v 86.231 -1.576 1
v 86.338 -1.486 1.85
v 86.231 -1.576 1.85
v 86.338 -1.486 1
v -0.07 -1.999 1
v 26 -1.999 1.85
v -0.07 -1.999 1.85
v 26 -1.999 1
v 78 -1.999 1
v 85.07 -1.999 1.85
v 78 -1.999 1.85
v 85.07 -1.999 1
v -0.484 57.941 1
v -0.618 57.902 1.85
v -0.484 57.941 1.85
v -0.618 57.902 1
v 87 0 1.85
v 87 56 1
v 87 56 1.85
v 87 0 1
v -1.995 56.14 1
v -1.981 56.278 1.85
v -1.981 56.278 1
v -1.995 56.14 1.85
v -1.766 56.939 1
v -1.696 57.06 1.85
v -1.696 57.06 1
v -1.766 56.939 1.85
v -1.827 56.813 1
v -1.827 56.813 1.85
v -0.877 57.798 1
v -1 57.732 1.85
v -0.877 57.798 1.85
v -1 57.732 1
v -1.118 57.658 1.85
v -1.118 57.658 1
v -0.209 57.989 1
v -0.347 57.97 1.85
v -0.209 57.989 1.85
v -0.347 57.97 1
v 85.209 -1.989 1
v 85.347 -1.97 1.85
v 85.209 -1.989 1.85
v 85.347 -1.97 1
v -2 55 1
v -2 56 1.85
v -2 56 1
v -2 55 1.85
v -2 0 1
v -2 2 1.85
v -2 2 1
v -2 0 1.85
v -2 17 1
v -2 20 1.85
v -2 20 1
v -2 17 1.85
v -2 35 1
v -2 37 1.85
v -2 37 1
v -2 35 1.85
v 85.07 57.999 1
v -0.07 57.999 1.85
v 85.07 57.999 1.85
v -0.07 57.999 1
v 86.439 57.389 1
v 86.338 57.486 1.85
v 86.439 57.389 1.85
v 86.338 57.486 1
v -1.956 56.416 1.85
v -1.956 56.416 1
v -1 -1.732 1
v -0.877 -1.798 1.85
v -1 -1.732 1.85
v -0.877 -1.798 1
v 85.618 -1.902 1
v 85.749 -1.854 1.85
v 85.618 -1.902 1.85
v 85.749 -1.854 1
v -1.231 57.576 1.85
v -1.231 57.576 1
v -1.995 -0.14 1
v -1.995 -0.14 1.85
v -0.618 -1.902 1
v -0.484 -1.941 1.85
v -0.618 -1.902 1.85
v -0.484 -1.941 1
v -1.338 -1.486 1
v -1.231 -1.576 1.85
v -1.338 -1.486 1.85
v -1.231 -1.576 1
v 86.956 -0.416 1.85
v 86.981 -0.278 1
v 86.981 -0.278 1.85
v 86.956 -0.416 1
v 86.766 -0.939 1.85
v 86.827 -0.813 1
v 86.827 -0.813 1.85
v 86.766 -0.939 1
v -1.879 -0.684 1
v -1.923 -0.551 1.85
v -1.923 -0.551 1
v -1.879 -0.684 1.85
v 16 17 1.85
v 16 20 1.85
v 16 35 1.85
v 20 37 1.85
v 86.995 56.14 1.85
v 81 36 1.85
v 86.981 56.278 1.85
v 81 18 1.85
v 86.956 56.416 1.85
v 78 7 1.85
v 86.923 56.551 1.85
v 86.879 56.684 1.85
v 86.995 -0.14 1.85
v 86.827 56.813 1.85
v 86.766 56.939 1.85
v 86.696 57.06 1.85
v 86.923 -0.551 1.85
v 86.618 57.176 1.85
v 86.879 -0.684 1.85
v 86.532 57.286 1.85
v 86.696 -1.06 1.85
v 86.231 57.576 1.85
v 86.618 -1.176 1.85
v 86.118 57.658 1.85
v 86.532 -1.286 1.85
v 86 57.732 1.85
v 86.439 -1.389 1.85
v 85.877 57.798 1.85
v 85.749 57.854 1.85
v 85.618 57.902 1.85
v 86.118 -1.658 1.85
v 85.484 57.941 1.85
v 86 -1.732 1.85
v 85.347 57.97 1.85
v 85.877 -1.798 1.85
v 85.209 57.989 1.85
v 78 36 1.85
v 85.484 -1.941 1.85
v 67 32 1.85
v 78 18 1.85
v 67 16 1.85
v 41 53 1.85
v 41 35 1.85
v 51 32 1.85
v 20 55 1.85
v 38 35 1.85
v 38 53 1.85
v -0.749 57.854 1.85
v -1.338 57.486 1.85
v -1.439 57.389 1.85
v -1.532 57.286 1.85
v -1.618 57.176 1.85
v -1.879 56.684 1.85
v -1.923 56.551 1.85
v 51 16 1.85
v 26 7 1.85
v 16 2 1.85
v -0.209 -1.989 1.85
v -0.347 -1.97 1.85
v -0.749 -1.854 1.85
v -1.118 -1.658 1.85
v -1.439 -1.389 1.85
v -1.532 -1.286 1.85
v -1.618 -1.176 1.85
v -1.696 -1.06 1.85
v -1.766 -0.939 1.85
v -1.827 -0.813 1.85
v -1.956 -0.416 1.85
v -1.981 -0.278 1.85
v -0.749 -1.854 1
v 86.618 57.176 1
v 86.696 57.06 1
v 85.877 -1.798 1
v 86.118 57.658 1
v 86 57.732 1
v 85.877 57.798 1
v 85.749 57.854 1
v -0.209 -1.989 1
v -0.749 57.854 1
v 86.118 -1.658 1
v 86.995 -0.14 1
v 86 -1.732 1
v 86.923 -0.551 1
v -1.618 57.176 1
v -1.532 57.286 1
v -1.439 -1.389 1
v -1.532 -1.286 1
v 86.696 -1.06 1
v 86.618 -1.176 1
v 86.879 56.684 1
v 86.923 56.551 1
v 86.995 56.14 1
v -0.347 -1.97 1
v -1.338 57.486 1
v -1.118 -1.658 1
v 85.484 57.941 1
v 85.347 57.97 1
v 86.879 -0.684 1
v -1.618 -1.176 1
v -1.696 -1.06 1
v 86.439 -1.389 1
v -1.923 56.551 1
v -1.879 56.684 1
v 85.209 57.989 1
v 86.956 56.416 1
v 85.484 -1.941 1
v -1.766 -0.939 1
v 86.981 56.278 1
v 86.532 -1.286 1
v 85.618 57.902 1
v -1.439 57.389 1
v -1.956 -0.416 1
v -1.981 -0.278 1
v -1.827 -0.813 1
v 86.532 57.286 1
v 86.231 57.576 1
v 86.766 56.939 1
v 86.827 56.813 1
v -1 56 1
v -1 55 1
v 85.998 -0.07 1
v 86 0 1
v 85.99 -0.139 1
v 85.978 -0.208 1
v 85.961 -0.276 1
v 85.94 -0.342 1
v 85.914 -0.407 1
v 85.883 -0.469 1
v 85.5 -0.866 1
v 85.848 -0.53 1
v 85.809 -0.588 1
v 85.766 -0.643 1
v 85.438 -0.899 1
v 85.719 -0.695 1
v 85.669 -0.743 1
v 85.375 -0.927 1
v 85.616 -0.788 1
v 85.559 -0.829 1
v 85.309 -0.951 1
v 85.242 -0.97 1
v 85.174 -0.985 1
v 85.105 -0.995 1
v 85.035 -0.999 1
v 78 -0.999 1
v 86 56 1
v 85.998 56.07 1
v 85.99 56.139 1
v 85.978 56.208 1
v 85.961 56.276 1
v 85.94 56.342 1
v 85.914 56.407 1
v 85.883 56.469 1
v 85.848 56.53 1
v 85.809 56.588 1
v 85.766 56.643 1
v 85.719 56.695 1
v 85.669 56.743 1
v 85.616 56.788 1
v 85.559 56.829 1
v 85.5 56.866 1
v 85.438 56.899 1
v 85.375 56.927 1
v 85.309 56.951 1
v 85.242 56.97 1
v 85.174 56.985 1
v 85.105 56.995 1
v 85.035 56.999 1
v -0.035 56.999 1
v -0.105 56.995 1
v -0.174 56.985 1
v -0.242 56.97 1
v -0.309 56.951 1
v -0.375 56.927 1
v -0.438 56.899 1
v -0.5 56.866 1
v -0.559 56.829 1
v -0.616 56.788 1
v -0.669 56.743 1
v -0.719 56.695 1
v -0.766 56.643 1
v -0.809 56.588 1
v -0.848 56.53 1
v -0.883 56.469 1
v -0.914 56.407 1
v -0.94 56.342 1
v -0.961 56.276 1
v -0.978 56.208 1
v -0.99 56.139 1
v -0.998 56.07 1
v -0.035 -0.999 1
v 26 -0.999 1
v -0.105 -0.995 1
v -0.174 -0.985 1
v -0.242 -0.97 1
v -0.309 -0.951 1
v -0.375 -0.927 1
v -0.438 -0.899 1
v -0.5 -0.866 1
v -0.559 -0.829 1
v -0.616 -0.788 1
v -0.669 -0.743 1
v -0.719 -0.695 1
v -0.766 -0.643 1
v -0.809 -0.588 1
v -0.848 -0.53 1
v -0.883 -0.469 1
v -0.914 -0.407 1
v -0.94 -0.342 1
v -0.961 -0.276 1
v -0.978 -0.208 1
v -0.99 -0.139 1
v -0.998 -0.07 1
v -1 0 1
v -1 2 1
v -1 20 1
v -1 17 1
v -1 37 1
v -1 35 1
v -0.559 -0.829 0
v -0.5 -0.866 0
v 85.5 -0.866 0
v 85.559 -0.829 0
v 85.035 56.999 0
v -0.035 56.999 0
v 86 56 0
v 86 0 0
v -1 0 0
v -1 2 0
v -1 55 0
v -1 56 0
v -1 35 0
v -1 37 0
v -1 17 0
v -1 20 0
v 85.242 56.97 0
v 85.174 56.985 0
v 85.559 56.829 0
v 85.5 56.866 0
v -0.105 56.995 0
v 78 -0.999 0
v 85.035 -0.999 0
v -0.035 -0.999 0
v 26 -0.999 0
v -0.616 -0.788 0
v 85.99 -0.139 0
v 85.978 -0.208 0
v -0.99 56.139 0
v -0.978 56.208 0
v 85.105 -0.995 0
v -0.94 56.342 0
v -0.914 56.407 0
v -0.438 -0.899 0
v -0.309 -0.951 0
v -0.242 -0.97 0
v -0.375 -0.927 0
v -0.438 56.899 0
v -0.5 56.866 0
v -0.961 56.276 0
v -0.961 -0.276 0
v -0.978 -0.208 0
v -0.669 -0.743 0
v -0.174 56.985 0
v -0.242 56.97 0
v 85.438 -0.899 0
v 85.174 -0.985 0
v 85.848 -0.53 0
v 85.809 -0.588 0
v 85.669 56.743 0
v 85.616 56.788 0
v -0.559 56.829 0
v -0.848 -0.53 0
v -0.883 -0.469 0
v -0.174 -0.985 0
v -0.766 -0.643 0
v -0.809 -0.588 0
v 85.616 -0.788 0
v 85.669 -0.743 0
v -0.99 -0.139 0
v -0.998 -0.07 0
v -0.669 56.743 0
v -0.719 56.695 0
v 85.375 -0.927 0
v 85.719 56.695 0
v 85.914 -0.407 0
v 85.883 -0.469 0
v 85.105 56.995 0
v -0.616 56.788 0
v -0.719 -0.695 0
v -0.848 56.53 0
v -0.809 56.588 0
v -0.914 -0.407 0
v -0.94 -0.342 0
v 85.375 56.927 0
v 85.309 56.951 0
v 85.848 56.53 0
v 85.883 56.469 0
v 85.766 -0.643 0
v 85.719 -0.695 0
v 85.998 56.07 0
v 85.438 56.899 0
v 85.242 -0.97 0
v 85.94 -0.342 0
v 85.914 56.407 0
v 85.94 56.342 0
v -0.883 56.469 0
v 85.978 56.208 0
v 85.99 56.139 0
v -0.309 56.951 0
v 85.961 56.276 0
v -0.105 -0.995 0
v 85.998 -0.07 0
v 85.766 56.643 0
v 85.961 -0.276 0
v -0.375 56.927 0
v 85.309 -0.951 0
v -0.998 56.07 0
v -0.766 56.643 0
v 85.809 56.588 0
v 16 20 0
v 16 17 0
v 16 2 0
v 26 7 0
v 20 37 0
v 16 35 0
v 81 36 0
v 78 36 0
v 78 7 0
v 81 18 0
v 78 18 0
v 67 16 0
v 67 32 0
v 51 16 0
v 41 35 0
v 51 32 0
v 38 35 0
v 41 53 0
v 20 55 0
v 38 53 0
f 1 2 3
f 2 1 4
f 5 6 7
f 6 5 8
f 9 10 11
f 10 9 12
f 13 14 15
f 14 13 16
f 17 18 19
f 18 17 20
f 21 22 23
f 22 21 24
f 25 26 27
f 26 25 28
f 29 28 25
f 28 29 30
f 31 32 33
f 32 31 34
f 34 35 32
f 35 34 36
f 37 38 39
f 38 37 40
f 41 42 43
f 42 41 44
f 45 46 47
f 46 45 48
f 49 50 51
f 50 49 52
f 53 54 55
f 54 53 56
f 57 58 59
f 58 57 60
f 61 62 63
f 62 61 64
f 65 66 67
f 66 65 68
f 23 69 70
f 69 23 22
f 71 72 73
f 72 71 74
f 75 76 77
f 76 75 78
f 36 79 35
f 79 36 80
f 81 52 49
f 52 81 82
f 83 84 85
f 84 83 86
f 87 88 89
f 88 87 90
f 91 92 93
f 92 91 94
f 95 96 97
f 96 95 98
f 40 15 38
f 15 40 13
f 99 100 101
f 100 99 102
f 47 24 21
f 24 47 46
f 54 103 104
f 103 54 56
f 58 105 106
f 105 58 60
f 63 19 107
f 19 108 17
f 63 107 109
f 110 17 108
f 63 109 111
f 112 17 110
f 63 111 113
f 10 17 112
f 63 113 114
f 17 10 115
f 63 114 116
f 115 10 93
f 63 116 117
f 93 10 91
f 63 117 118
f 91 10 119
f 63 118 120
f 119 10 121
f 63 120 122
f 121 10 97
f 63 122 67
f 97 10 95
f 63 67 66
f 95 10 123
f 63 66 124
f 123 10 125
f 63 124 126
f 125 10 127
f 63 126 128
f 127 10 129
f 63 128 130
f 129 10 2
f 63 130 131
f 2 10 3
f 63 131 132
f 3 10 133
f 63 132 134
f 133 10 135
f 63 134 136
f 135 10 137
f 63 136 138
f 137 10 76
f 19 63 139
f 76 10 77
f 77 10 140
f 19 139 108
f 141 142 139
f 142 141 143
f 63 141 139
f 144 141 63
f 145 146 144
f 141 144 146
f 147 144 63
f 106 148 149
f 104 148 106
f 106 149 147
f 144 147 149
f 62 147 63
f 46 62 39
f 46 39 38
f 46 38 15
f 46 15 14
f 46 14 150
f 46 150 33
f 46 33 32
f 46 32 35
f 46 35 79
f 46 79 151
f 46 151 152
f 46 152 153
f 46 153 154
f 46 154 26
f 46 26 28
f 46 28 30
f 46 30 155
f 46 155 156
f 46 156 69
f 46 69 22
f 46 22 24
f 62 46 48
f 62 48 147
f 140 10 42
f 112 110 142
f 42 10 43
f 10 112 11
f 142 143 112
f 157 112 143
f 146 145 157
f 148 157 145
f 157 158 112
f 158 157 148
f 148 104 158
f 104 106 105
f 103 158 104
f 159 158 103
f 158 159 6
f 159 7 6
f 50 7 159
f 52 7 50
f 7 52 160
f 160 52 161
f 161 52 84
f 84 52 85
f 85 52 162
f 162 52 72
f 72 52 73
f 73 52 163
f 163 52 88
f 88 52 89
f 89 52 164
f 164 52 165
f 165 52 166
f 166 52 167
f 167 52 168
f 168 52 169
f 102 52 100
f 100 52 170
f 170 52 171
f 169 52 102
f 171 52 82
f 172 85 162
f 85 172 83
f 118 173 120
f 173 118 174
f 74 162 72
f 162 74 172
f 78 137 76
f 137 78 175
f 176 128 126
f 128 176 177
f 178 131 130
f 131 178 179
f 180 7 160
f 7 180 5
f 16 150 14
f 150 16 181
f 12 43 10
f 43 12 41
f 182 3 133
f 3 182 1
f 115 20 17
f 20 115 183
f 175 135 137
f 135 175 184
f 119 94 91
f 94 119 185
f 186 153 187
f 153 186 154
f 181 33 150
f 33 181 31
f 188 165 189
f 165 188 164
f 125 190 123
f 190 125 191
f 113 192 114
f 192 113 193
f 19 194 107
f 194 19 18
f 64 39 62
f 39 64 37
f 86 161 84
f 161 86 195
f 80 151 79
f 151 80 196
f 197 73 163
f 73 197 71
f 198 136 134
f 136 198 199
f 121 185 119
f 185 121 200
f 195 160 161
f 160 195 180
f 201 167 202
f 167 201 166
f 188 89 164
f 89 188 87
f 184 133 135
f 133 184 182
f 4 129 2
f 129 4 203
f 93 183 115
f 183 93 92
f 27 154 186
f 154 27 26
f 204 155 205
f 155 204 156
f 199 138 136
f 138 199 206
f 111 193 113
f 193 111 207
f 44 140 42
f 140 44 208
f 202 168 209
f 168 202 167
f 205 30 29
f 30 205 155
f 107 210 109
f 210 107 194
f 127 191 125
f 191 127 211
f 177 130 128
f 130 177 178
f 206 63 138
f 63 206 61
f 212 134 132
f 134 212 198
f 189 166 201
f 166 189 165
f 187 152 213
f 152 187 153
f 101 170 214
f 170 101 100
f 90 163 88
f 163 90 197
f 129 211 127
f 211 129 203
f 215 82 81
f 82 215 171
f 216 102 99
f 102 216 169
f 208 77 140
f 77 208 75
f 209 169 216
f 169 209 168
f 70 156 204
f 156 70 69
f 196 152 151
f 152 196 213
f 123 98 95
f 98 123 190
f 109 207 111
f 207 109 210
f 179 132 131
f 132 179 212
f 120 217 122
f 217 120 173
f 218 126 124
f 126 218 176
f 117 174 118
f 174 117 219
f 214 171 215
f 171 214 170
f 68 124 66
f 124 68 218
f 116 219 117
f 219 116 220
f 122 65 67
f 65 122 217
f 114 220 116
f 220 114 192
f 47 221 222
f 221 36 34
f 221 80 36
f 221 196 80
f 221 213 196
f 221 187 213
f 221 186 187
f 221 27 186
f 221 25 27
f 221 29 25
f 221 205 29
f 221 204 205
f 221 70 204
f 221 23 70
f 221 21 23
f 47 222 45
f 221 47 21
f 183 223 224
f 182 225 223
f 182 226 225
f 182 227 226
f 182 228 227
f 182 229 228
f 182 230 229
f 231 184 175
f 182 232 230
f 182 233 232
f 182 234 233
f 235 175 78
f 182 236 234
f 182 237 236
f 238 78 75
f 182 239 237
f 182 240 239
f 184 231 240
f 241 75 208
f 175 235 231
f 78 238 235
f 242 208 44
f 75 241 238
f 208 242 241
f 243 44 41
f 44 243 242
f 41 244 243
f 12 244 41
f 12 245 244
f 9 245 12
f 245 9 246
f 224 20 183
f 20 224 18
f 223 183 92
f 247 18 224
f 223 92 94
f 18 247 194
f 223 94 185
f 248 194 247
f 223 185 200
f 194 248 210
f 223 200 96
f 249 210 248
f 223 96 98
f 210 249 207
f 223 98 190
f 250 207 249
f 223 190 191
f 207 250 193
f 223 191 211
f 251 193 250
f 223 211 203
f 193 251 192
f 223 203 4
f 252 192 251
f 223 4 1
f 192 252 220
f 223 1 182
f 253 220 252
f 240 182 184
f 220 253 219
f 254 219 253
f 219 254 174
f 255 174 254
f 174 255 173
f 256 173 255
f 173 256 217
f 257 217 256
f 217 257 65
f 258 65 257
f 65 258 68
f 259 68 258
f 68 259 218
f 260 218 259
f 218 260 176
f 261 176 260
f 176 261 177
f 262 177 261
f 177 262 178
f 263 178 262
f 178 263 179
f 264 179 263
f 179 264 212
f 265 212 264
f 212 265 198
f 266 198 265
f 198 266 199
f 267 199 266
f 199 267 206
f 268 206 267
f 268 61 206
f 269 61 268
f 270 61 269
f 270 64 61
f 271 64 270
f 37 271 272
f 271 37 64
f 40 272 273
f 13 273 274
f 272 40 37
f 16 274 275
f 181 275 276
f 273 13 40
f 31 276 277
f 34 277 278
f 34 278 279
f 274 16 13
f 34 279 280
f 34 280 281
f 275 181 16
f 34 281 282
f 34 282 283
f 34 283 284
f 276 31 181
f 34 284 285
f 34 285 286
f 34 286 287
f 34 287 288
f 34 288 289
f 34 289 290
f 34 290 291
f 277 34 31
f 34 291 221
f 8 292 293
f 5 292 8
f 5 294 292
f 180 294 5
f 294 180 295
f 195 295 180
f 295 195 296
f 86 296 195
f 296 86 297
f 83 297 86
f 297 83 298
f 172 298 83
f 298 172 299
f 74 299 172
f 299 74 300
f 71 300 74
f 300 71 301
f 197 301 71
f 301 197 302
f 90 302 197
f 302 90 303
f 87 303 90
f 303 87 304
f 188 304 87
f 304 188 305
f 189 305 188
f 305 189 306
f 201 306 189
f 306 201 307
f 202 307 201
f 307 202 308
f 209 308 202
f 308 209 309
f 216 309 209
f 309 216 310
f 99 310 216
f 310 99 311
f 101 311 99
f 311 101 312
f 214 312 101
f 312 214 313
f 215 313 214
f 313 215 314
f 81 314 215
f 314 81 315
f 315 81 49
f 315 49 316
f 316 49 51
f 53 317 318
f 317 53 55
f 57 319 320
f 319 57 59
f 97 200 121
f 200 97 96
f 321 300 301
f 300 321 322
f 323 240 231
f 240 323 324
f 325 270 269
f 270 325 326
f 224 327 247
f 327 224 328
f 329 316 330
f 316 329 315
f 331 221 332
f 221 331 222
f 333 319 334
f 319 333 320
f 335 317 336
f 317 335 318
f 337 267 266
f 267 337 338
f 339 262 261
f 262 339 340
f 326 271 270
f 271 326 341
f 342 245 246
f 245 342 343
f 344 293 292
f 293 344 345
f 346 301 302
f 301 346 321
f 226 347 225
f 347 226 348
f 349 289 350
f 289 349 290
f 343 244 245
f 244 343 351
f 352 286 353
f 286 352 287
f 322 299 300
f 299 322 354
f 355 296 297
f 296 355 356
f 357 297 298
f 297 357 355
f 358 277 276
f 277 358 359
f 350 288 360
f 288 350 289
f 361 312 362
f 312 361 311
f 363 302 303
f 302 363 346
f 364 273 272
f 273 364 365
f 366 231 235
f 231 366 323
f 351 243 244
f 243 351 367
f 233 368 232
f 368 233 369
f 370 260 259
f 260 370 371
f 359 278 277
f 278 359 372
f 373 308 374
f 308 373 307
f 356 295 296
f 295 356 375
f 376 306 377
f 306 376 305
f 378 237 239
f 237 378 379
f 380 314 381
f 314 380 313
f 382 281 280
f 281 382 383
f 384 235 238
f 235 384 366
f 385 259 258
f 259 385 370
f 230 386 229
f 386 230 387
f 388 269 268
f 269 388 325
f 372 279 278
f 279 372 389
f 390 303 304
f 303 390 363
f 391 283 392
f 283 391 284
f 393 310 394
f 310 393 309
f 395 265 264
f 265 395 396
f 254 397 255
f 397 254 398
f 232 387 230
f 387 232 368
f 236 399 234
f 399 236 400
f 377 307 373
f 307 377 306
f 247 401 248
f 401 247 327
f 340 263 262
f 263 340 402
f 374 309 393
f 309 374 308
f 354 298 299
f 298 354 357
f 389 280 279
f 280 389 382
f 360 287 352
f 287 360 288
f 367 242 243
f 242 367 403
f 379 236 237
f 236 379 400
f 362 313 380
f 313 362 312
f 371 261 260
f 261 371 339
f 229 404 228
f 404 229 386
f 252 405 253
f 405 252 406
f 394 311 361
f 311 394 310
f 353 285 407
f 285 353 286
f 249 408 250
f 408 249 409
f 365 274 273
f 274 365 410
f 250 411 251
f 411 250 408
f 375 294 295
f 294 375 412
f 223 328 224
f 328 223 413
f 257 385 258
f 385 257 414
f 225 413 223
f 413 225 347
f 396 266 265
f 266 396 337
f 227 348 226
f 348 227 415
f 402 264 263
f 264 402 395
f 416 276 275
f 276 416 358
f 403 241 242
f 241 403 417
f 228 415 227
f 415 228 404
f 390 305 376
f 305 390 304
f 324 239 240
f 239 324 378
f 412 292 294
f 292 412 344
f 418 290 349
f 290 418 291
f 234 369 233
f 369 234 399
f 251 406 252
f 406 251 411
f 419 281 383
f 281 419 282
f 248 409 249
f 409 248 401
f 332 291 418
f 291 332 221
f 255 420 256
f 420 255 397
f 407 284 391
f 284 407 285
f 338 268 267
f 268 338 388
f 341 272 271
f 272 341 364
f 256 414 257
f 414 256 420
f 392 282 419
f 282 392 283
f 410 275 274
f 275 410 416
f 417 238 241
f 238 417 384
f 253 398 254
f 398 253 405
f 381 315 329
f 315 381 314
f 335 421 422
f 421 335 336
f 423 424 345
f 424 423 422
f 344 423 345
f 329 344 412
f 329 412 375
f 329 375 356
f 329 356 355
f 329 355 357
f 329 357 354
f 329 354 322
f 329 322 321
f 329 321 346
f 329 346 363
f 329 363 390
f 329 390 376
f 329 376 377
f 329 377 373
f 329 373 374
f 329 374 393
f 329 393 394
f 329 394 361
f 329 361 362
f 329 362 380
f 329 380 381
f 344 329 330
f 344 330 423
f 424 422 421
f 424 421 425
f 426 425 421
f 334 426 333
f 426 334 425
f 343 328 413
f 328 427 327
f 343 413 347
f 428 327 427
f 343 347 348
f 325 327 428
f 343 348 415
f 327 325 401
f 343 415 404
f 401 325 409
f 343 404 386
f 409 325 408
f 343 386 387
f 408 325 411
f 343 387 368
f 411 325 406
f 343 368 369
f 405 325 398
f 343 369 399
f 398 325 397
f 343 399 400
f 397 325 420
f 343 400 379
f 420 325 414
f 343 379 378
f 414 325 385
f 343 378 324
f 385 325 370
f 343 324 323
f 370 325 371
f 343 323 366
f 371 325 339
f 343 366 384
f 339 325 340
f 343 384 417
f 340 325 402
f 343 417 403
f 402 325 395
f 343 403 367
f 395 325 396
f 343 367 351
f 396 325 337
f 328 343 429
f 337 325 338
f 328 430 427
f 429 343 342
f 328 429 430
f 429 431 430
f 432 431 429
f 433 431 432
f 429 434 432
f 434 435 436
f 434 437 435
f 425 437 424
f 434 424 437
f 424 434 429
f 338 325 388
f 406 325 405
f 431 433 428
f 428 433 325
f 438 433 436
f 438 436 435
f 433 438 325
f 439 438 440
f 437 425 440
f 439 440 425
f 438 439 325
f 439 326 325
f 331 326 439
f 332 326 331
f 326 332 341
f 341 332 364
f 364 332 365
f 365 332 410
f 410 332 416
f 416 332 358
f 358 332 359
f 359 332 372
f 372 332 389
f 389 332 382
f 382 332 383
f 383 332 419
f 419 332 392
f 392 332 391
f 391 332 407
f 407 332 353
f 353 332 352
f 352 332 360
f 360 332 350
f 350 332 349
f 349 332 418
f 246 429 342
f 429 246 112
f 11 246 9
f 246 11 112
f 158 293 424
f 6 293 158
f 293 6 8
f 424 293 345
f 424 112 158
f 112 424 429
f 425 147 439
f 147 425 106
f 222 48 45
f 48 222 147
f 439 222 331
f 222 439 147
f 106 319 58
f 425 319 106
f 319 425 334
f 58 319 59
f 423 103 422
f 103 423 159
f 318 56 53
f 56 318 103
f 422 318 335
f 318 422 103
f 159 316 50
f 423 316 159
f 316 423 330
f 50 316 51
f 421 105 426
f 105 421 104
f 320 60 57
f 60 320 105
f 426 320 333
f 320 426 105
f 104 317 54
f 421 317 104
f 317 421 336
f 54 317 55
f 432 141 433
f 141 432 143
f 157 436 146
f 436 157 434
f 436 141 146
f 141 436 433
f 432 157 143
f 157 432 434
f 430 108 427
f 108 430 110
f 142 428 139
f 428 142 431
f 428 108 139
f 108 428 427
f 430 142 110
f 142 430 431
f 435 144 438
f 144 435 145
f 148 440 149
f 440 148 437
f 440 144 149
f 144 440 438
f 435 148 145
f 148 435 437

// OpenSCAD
$fn=90;
/*
difference(){
    
    horse();
    translate([2,-58,3.5])cube([80,56,100]);
    translate([15,-56,5])cube([80,52,100]);
    translate([5.5,-5.5,-1])cylinder(h=15,d=2);
    translate([63.5,-5.5,-1])cylinder(h=15,d=2);
    translate([5.5,-54.5,-1])cylinder(h=15,d=2);
    translate([63.5,-54.5,-1])cylinder(h=15,d=2);
    s=20;
    a=0;b=-3;
    for(y=[-10:-s/2/tan(60):-50]){
        i=(y+10)/s*tan(60);echo(i);
        for(x=[15+s*cos(60)*cos(i*180)*cos(i*180):s:75]){
        
        
            translate([x+1,y+b,-1])cylinder(d=s/1.5-4,h=10,$fn=100);
        }
    }
}
*/
//#translate([85.5,0,0])rotate([0,180,0])horse();
module horse(){
    
    shell();
    
    translate([-1.5,57+1.5,0])rotate([90,0,0])import ("E:\\KosselMini_Windows\\STL\\raspberrypi3\\Case_Top-Heatsink_Cutout_Only.STL",convexity=10);
    }



//shell();
    base();
module base(){
    difference(){
    union(){
        translate([0,0,1])minkowski(){cube([85,56,0.75]);cylinder(r=2,h=0.1); }
    
        minkowski(){cube([85,56,1.5]);cylinder(r=1,h=0.1); }
        }

    translate([0,0,-1])
    union(){
        translate([85-52-7,-2,0])cube([52,7+2,5]);
        translate([-2,37,0])cube([22,18,5]);
        translate([-2,2,0])cube([18,15,5]);
        translate([-2,20,0])cube([18,15,5]);
        translate([51,16,0])cube([16,16,5]);
        translate([78,18,0])cube([3,18,5]);
        translate([38,35,0])cube([3,18,5]);
        }
    }
    }
